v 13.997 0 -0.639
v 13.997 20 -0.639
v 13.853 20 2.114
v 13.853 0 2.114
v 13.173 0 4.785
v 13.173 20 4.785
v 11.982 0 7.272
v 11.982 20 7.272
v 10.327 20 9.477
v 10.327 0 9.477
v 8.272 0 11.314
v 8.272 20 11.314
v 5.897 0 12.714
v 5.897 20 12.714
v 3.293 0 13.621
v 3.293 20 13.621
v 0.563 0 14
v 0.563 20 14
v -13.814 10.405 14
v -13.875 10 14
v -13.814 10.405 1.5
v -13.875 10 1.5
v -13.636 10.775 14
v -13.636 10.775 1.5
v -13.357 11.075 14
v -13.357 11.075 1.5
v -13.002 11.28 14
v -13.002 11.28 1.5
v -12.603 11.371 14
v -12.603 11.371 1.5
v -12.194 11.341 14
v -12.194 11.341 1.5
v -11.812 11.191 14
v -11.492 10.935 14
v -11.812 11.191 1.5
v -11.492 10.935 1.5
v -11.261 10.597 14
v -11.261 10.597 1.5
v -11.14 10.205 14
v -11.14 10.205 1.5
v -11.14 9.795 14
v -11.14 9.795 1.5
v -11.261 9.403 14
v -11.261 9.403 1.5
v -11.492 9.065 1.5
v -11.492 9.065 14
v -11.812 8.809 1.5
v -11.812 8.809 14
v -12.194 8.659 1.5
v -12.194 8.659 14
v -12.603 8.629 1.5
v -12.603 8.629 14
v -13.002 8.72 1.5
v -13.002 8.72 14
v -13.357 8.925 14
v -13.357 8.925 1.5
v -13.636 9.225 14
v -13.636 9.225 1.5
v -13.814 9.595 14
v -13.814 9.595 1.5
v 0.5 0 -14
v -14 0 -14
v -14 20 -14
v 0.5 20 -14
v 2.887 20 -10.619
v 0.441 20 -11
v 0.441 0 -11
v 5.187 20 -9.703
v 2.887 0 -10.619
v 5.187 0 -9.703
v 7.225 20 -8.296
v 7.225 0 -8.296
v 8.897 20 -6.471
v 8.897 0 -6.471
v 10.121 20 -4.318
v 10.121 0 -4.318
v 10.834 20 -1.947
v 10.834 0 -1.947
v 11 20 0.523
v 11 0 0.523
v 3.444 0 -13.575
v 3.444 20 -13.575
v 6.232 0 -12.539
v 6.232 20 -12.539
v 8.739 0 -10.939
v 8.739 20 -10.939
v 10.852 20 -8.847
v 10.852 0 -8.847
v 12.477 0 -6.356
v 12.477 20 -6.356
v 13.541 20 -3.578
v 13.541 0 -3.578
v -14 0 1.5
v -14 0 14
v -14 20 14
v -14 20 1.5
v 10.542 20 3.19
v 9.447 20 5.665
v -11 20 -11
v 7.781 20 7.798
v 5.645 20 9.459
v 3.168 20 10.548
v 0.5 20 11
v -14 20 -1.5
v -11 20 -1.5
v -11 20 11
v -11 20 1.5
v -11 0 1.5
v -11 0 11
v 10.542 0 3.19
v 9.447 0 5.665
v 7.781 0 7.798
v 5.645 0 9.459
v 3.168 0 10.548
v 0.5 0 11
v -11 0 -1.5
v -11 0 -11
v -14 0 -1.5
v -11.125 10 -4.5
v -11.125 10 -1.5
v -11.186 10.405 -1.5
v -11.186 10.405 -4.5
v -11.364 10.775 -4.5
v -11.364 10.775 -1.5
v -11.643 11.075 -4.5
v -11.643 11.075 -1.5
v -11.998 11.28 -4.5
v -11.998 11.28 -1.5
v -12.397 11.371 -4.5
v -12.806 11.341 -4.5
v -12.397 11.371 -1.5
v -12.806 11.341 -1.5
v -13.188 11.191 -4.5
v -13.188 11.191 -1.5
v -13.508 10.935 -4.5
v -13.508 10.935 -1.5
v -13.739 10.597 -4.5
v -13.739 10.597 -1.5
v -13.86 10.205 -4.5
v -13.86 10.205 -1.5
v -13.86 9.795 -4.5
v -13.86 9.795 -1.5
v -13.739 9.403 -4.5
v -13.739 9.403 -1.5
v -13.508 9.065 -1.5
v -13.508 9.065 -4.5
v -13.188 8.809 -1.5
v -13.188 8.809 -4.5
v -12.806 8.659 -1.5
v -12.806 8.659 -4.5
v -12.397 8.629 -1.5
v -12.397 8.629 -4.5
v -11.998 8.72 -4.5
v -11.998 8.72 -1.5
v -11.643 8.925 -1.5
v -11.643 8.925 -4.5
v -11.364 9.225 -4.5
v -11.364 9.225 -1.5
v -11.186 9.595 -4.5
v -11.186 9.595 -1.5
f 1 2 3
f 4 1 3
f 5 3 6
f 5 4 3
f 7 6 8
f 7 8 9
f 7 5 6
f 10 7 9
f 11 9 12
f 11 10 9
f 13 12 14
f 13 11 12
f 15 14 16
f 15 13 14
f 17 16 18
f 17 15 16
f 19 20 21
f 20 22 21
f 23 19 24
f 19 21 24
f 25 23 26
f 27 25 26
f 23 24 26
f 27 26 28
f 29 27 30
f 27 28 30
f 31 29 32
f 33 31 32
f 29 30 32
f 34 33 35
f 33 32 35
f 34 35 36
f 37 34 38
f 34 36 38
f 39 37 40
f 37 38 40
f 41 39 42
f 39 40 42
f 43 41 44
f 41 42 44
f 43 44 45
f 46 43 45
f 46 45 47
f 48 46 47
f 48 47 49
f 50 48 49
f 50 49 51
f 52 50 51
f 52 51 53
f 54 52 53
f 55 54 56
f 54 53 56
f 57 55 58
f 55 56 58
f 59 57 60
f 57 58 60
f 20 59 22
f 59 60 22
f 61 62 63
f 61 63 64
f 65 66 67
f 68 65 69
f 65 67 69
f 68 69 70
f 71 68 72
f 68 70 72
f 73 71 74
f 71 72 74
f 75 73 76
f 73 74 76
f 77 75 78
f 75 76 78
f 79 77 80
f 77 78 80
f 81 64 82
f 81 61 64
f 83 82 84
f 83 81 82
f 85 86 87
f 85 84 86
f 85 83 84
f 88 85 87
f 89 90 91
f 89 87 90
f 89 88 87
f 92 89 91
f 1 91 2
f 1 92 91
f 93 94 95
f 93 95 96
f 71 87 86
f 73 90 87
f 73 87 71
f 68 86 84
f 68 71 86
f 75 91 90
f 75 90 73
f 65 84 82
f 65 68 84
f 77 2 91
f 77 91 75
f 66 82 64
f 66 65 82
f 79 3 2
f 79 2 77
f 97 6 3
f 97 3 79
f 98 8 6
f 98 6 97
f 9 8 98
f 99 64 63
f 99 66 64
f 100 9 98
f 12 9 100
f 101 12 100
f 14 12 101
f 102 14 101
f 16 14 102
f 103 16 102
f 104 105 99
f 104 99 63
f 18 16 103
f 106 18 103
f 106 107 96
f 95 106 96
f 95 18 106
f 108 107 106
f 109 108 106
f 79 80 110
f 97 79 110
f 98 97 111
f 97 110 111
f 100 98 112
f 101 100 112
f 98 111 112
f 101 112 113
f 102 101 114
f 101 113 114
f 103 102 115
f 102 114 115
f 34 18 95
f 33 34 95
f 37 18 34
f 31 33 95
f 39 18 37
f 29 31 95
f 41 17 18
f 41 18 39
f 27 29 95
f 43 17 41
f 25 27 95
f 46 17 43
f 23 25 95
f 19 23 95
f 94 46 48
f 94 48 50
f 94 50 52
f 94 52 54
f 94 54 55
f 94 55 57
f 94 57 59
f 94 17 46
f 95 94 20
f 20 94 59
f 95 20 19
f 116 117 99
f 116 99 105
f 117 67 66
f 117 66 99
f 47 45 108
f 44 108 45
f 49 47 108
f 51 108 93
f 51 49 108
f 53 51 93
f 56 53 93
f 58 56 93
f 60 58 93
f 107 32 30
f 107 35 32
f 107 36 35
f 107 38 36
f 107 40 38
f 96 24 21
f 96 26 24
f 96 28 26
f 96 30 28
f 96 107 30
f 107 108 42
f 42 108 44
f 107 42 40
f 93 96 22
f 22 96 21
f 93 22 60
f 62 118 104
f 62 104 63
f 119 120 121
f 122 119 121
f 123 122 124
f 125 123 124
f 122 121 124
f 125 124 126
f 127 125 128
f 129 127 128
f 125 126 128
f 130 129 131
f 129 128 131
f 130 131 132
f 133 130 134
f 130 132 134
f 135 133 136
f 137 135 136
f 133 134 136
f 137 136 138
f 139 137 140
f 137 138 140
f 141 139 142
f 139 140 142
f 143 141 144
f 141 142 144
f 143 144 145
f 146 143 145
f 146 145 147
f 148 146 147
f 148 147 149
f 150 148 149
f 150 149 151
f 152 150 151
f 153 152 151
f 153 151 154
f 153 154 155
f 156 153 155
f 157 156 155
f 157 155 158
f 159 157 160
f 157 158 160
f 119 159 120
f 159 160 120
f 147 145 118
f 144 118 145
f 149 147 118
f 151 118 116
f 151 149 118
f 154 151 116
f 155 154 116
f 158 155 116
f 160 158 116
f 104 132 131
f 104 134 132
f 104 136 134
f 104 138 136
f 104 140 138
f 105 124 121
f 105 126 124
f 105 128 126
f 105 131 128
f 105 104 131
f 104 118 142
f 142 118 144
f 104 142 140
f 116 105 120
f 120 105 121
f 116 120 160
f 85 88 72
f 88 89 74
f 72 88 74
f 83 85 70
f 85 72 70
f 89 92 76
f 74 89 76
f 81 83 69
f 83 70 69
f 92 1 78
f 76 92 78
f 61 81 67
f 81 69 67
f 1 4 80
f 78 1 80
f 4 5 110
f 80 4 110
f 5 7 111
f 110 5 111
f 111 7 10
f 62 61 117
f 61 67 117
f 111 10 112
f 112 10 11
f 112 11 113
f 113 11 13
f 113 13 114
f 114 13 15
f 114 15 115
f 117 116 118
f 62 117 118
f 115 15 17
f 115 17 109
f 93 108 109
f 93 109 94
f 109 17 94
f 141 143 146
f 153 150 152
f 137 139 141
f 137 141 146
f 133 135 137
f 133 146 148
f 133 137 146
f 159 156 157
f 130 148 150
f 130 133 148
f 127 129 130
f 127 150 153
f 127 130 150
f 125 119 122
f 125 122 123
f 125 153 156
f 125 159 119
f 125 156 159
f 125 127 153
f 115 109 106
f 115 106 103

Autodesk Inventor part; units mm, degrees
ref_plane "YZ Plane" through (0, 0, 0) normal (1, 0, 0) x (0, 1, 0)
sketch "Esquisse1" plane through (0, 0, 0) normal (0, 1, 0) x (-1, 0, 0)
  line L0 (11, -11) -> (11, 11)
  arc A0 (-0.5, 11) -> (-11, -0.5) centre (-0.0119, 0.0108) ccw
  arc A1 (-11, 0.5) -> (0, -11) centre (-0.0114, 0) ccw
  line L1 (11, 11) -> (-0.5, 11)
  line L2 (11, -11) -> (-0.5, -11)
  arc A2 (-0.5626, 14) -> (-13.9968, -0.6393) centre (-0.0119, 0.0108) ccw
  line L3 (-0.5626, 14) -> (14, 14)
  line L4 (14, 14) -> (14, -14)
  line L5 (14, -14) -> (-0.5, -14)
  arc A3 (-13.9968, 0.661) -> (-0.5, -14) centre (0.0221, 0.0236) ccw
  point P0 (0, 0)
  point P1 (-11, 0)
extrude "Extrusion1" add sketch "Esquisse1" along normal blind 20 contours L2 A1 A0 L1 L0 | L3 L4 L5 A3 A2
sketch "Esquisse2" plane through (0, 0, 0) normal (0, -1, 0) x (1, 0, 0)
  line L0 (13.9968, 0.661) -> (13.9968, 0.661)
  arc A0 (10.9999, 0.5232) -> (0.5, 11) centre (0.0119, 0.0108) ccw
  arc A1 (0.4408, -11) -> (10.9999, 0.5232) centre (-0.0221, 0.0236) ccw
  line L1 (0.4408, -11) -> (-11, -11)
  line L2 (-11, -11) -> (-11, 11)
  line L3 (-11, 11) -> (0.5, 11)
  point P0 (0, 0)
extrude "Extrusion2" cut sketch "Esquisse2" against normal blind 20
sketch "Esquisse3" plane through (-11, 0, 11) normal (1, 0, 0) x (0, 0, -1)
  point P0 (11, 0)
sketch "Esquisse4" plane through (0, 20, 0) normal (0, 1, 0) x (1, 0, 0)
  line L0 (-14, 1.5) -> (-11, 1.5)
  line L1 (-11, 1.5) -> (-11, -1.5)
  line L2 (-11, -1.5) -> (-14, -1.5)
  line L3 (-14, -1.5) -> (-14, 1.5)
ref_plane "Plan de construction2" through (-14, 20, -1.5) normal (0, 0, 1) x (1, 0, 0)
ref_plane "Plan de construction3" through (-11, 20, 1.5) normal (0, 0, -1) x (-1, 0, 0)
extrude "Extrusion6" cut sketch "Esquisse4" against normal through all
sketch "Esquisse7" plane through (-11, 20, 1.5) normal (0, 0, -1) x (-1, 0, 0)
  line L0 (3, 0) -> (3, -20) projected
  line L1 (3, 0) -> (3, -10)
  line L2 (3, -10) -> (1.5, -10)
  circle A0 centre (1.5, -10) radius 1.375
  point P0 (-11, -20)
  dimension "d46" = 10
  dimension "d47" = 1.5
  dimension "d48" = 2.75
extrude "Extrusion7" cut sketch "Esquisse7" against normal through all
sketch "Esquisse8" plane through (-14, 20, -1.5) normal (0, 0, 1) x (1, 0, 0)
  line L0 (3, 0) -> (3, -10)
  line L1 (3, -10) -> (1.5, -10)
  circle A0 centre (1.5, -10) radius 1.375
  point P0 (-11, -20)
  dimension "d51" = 10
  dimension "d52" = 1.5
  dimension "d53" = 2.75
extrude "Extrusion9" cut sketch "Esquisse8" against normal blind 3
thread "Filetage1" size "M3x0.5" class "6H" standard "ANSI Metric M Profile" length 14.5
thread "Filetage2" size "M3x0.5" class "6H" standard "ANSI Metric M Profile" full length
thread "Filetage3" size "M3x0.5" class "6H" standard "ANSI Metric M Profile" length 3
properties part number "Goupille"
